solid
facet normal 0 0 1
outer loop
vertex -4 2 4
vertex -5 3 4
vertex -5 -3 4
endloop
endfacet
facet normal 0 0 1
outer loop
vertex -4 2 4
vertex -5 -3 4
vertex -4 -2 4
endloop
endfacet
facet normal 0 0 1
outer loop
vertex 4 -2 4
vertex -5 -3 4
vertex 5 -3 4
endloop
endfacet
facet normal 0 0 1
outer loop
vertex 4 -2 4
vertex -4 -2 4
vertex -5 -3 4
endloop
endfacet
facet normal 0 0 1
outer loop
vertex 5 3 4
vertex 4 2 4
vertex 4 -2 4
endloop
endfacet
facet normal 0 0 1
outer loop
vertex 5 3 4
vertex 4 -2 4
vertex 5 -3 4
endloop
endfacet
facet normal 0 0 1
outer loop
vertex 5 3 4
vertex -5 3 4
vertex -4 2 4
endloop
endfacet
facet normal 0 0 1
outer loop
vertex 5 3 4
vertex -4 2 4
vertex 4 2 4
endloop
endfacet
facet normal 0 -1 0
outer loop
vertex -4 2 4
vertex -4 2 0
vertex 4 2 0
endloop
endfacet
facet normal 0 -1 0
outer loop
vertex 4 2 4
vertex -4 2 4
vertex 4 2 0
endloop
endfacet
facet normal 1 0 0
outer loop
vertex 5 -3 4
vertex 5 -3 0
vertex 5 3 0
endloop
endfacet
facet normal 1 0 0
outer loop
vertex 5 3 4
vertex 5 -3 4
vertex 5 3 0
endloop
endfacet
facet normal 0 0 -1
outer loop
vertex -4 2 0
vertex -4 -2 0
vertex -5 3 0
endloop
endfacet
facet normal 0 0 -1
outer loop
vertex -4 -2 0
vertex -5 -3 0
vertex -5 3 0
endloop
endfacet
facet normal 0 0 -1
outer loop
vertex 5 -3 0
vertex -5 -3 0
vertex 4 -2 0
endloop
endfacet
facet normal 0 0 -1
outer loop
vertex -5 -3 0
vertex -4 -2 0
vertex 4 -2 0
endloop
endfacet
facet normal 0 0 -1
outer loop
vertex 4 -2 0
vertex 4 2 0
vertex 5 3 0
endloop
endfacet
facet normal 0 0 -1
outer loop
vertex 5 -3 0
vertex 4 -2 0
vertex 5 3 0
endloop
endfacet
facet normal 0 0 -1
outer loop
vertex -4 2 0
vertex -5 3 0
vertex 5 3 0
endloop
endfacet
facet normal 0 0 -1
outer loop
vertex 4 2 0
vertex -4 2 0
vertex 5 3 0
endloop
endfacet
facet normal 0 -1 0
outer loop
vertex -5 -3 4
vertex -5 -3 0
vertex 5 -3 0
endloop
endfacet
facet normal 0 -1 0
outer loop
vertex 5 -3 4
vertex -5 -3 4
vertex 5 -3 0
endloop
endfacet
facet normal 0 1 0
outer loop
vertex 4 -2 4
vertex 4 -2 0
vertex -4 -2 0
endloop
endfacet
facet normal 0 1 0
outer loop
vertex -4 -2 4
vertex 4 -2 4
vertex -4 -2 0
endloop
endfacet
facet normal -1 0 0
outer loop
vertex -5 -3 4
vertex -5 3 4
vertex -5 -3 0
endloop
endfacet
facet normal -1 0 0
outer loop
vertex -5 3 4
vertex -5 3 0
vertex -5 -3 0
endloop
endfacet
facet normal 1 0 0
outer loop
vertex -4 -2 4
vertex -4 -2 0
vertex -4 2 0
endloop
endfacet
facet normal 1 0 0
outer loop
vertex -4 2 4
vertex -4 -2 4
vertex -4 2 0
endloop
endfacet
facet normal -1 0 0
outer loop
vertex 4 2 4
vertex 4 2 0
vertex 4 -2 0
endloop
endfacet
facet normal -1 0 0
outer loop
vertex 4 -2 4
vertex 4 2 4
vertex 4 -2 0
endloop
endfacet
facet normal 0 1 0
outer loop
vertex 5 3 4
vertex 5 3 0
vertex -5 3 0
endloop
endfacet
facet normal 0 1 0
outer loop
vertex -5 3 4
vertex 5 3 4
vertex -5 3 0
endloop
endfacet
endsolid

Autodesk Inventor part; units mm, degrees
ref_plane "YZ Plane" through (0, 0, 0) normal (1, 0, 0) x (0, 1, 0)
ref_plane "XZ Plane" through (0, 0, 0) normal (0, 1, 0) x (-1, 0, 0)
sketch "Sketch1" plane through (0, 0, 0) normal (0, 0, 1) x (1, 0, 0)
  line L0 (-4, 2) -> (4, 2)
  line L1 (4, 2) -> (4, -2)
  line L2 (4, -2) -> (-4, -2)
  line L3 (-4, -2) -> (-4, 2)
  line L4 (5, 3) -> (-5, 3)
  line L5 (-5, 3) -> (-5, -3)
  line L6 (-5, -3) -> (5, -3)
  line L7 (5, -3) -> (5, 3)
  point P0 (0, 0)
  dimension "d0" = 8
  dimension "d1" = 4
  dimension "d2" = 2
  dimension "d3" = 4
  dimension "d5" = 1
extrude "Extrusion1" add sketch "Sketch1" along normal blind 4
ref_plane "Work Plane1" through (0, 0, 2) normal (0, 0, 1) x (1, 0, 0)
sketch "Sketch2" plane through (0, 0, 2) normal (0, 0, 1) x (1, 0, 0)
  line L0 (0, 0) -> (5.4411, 0) construction
  point P0 (2.25, 1)
  point P1 (0.75, 1)
  point P2 (-0.75, 1)
  point P3 (-2.25, 1)
  dimension "d11" = 1.5
  dimension "d16" = 2.25
  dimension "d17" = 1
properties part number "CrimpSocket"
